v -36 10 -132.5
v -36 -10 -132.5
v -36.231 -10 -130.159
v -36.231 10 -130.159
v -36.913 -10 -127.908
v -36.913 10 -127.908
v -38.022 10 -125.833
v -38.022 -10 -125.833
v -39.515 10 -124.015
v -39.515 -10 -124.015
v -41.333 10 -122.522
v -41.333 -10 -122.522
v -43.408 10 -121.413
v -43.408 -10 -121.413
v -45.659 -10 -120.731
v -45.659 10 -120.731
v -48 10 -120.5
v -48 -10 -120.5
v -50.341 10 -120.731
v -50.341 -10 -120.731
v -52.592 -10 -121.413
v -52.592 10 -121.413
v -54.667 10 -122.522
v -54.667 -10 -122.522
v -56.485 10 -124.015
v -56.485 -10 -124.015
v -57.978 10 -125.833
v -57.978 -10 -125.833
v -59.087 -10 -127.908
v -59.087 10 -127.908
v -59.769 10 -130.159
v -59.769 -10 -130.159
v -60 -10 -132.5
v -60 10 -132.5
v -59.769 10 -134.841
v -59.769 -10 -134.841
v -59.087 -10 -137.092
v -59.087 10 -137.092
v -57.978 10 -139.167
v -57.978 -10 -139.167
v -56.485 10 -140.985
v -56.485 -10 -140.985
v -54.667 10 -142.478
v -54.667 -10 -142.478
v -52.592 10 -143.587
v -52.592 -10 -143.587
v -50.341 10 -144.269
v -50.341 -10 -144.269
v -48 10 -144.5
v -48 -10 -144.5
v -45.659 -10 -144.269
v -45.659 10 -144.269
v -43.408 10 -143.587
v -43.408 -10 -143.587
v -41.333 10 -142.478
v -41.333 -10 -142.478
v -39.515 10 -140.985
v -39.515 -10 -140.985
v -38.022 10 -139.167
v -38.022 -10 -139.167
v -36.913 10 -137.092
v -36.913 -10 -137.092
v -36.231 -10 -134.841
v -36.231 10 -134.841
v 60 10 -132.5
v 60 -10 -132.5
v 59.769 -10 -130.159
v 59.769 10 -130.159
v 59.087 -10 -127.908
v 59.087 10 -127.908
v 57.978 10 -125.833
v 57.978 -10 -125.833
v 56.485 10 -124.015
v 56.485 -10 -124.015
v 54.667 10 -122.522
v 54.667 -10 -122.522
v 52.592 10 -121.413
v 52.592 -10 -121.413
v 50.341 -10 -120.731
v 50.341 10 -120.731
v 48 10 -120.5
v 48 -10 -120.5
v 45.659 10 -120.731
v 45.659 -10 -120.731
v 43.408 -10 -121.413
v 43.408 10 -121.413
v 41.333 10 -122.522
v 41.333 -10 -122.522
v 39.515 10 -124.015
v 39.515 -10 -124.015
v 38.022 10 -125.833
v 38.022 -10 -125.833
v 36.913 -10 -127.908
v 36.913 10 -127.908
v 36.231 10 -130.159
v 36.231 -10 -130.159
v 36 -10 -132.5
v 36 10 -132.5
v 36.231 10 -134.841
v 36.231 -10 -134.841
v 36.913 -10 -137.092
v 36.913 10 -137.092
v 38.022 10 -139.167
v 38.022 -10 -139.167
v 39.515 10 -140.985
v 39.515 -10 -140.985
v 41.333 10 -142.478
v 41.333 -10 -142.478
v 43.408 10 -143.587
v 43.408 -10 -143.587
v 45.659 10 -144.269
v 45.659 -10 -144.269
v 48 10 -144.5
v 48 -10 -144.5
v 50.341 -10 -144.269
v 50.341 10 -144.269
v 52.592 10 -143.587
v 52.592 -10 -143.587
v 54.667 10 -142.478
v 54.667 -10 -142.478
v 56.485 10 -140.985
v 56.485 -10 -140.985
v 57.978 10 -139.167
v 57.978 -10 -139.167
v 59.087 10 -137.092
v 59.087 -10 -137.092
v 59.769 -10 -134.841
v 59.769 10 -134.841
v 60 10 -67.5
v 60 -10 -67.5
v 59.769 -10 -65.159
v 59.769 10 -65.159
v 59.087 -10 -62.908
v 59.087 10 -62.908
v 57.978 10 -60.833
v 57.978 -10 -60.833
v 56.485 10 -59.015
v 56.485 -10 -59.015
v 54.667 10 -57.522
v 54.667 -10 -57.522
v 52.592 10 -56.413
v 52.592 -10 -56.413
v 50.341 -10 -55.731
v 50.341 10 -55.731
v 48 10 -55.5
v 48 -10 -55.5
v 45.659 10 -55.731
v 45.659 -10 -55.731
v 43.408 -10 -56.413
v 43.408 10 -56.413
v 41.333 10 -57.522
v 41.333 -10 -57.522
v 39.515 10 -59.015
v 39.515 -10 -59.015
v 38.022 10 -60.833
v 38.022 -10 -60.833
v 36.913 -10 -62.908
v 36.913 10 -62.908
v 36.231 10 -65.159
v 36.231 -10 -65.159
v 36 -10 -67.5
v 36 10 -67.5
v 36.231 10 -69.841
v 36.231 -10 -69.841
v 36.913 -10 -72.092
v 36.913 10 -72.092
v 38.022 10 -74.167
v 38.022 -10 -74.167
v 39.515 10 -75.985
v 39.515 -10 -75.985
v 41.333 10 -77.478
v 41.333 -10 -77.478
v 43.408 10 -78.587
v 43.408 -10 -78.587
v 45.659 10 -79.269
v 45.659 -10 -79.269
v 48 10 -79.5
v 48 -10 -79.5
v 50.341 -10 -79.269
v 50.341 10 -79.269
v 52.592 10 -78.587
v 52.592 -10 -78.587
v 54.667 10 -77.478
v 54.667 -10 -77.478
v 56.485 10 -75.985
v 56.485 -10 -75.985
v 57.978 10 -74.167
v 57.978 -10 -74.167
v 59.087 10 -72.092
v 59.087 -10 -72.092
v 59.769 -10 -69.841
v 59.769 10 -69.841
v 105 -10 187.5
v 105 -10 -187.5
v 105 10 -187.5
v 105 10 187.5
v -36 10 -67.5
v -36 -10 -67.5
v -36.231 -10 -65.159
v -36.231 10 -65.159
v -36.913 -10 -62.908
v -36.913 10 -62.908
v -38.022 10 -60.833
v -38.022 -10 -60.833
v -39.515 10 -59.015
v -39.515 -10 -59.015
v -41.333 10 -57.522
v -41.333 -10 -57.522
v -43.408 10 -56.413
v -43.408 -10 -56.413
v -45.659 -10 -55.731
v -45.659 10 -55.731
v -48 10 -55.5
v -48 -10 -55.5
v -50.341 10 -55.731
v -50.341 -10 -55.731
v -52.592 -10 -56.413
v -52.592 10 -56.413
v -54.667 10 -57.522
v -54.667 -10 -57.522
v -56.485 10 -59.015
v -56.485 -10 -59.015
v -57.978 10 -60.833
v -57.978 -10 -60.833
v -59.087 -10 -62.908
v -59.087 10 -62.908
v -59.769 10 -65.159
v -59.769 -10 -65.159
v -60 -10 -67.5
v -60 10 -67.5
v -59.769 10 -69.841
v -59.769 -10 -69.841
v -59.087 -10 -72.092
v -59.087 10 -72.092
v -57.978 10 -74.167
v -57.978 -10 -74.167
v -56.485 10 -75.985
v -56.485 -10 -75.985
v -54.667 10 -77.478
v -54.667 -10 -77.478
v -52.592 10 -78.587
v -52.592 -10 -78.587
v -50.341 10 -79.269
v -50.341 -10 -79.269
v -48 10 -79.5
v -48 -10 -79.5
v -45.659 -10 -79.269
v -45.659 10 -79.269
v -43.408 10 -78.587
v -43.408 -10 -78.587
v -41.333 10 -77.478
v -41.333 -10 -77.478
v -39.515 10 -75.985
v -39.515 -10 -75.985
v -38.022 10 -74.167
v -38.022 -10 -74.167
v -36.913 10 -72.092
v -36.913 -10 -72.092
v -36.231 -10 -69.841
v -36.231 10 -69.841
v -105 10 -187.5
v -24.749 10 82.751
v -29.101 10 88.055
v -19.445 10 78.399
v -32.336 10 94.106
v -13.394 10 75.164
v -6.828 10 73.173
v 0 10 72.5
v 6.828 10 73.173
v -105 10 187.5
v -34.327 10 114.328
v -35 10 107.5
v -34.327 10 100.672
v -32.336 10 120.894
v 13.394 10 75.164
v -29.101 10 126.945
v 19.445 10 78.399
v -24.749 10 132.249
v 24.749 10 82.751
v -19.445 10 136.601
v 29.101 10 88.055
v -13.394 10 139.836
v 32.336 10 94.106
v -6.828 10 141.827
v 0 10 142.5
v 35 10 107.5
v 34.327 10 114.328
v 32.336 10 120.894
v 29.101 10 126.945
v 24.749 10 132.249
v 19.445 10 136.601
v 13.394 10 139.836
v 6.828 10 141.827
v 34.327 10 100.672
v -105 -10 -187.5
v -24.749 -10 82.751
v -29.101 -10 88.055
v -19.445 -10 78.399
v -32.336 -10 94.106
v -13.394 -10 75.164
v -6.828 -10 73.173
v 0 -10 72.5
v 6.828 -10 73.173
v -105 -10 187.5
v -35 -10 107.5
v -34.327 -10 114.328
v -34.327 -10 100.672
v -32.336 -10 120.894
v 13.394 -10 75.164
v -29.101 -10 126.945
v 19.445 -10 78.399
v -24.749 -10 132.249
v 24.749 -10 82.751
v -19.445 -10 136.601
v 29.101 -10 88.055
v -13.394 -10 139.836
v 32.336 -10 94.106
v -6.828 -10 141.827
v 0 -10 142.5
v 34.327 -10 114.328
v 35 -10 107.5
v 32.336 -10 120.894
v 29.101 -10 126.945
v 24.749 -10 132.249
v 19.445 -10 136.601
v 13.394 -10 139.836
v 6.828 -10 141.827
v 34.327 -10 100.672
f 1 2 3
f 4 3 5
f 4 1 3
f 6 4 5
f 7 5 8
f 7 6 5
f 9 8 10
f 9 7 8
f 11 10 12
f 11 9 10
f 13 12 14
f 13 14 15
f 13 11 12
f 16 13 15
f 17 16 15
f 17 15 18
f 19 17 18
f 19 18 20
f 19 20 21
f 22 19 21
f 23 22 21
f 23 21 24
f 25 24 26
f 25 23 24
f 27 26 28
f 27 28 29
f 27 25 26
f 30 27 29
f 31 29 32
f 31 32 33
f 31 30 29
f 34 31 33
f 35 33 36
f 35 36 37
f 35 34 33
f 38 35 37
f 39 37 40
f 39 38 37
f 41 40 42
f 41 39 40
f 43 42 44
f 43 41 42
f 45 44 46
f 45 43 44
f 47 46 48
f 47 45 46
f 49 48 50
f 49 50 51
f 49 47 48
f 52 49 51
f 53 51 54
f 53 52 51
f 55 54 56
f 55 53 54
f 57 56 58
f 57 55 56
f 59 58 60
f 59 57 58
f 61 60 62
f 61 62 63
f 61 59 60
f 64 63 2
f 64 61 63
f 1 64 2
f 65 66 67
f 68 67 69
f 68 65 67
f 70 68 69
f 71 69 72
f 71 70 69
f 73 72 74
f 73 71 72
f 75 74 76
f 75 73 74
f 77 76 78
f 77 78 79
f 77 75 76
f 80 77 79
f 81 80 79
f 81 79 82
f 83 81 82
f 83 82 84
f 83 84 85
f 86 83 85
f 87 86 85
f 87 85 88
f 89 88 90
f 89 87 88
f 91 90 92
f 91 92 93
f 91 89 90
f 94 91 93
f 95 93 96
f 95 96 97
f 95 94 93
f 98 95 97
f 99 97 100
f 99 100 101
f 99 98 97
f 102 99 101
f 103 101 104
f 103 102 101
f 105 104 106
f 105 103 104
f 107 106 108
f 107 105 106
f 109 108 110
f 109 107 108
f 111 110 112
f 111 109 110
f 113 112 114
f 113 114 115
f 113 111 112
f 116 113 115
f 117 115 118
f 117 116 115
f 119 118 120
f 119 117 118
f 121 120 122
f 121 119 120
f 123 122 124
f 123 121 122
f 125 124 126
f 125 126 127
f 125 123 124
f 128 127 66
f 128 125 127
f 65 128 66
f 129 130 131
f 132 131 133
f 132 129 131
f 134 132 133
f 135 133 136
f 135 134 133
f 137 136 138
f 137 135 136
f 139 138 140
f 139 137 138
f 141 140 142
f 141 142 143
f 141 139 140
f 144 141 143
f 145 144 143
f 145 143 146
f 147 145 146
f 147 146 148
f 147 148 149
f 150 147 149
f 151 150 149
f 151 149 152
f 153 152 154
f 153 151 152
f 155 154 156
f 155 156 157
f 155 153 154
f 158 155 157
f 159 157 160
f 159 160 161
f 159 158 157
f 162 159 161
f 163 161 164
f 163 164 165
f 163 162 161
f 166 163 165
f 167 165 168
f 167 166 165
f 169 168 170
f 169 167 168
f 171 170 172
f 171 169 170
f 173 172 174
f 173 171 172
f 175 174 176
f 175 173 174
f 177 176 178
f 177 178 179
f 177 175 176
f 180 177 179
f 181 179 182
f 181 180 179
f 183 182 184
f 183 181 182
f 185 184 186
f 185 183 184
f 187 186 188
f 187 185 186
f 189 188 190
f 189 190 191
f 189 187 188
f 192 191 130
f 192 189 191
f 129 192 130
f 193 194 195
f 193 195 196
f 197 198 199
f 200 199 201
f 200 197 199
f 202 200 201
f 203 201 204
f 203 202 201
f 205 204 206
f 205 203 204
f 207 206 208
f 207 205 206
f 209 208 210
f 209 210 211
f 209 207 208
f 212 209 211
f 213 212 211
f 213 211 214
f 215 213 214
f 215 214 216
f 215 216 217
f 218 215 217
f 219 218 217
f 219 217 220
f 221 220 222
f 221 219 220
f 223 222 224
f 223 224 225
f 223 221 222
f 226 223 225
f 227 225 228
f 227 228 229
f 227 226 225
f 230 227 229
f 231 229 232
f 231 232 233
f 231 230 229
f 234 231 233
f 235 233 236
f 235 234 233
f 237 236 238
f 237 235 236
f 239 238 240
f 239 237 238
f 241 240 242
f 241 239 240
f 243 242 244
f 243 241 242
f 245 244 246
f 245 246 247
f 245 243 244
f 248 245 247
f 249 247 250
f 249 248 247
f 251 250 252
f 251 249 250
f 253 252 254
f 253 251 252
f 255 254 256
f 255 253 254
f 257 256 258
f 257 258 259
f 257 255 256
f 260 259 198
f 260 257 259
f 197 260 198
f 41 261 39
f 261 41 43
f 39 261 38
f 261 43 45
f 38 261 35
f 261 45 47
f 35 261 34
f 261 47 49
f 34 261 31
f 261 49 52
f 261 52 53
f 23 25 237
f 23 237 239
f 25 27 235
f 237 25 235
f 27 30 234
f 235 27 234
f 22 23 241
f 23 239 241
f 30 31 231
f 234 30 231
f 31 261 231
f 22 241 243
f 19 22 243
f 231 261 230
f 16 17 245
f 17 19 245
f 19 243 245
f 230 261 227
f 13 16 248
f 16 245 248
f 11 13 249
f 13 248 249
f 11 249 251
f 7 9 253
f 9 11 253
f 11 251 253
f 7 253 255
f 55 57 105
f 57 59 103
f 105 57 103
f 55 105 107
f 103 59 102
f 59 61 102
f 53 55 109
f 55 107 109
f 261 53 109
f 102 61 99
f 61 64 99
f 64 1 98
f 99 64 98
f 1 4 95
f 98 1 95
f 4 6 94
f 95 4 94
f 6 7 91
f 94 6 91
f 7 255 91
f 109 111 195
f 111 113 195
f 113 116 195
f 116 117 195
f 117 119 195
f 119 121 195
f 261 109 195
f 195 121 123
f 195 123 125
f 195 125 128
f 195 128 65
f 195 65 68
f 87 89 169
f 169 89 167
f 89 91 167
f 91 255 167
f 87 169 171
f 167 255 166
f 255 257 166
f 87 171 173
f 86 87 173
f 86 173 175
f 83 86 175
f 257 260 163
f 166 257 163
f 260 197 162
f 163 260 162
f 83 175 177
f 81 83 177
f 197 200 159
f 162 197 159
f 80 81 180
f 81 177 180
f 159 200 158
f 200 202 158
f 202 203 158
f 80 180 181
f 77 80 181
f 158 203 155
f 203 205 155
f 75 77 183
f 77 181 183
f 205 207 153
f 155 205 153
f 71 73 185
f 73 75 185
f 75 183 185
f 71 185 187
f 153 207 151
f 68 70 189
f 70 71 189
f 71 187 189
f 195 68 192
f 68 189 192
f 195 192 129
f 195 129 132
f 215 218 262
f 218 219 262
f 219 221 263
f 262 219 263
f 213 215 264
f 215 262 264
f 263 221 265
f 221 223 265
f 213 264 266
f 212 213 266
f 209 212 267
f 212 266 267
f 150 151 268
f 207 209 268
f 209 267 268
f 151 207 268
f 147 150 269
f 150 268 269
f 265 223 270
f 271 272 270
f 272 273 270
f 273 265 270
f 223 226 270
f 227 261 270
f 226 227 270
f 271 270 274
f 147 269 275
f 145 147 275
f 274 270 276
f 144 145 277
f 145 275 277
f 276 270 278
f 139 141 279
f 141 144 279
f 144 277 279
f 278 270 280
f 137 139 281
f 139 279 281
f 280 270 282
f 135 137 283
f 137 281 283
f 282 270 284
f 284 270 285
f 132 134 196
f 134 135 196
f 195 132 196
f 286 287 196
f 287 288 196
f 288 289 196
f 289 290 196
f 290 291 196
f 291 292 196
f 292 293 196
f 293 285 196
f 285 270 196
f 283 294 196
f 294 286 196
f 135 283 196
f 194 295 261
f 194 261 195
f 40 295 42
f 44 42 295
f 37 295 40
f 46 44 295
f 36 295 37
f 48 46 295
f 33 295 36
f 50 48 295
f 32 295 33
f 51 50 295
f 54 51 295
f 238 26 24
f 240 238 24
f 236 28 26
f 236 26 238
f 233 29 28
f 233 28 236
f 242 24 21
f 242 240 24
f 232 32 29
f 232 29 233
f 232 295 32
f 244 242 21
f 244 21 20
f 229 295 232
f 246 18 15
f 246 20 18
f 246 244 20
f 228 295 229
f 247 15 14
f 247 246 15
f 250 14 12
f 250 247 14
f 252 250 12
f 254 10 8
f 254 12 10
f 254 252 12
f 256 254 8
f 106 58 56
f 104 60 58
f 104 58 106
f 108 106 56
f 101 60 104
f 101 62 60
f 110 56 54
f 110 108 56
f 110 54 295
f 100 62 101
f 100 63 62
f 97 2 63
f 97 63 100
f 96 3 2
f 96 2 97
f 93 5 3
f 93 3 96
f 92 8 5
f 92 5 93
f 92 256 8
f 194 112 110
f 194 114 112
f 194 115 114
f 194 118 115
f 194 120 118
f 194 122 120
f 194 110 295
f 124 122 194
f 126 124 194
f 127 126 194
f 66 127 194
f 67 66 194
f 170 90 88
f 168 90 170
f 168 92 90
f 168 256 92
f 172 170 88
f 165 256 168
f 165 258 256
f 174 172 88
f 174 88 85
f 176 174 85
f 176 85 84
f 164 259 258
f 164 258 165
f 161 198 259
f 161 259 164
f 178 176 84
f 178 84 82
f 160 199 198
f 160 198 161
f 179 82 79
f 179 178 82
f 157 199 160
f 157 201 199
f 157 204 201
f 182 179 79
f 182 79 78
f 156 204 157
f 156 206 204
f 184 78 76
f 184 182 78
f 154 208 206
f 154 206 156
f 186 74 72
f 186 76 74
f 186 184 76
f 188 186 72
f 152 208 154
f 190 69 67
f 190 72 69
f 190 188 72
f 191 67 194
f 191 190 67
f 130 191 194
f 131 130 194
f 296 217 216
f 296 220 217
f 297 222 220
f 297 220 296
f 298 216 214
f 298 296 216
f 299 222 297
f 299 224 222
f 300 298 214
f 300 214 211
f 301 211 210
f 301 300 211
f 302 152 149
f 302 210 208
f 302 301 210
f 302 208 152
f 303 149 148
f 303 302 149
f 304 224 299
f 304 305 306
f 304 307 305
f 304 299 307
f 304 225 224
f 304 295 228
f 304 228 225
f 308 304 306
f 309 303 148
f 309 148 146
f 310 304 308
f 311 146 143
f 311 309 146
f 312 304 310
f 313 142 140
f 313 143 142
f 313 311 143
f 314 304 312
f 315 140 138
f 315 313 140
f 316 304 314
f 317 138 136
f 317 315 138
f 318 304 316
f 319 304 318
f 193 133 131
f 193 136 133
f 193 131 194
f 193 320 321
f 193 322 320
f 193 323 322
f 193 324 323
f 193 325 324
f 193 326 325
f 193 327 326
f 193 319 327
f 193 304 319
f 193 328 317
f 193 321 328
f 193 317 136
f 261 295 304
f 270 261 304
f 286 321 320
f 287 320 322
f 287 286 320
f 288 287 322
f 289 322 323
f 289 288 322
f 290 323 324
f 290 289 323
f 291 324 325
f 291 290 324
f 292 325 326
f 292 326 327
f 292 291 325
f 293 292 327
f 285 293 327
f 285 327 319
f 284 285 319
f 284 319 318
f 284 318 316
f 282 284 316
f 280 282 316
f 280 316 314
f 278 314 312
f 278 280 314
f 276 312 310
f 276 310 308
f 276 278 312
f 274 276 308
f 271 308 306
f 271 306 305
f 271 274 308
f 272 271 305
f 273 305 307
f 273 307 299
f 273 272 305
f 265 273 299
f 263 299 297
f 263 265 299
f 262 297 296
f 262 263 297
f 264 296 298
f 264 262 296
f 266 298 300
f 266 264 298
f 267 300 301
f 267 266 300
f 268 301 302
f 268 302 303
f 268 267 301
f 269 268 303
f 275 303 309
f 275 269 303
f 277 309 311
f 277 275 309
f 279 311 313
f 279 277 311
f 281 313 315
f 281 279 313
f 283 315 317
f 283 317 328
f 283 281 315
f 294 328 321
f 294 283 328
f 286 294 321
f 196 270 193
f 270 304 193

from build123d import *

# Parameters (mm, degrees)
F0_W     = 210
F0_H     = 375
F0_R     = 12
F0_R_2   = 35
F1_DEPTH = 10


with BuildPart() as f1:
    # F0 (on Front) → F1 (new body, symmetric)
    with BuildSketch(Plane.XZ):
        Rectangle(F0_W, F0_H)
        with Locations((-48, -132.5)):
            Circle(F0_R, mode=Mode.SUBTRACT)
        with Locations((-48, -67.5)):
            Circle(F0_R, mode=Mode.SUBTRACT)
        with Locations((48, -132.5)):
            Circle(F0_R, mode=Mode.SUBTRACT)
        with Locations((48, -67.5)):
            Circle(F0_R, mode=Mode.SUBTRACT)
        with Locations((0, 107.5)):
            Circle(F0_R_2, mode=Mode.SUBTRACT)
    extrude(amount=F1_DEPTH, both=True)


solid = f1.part
